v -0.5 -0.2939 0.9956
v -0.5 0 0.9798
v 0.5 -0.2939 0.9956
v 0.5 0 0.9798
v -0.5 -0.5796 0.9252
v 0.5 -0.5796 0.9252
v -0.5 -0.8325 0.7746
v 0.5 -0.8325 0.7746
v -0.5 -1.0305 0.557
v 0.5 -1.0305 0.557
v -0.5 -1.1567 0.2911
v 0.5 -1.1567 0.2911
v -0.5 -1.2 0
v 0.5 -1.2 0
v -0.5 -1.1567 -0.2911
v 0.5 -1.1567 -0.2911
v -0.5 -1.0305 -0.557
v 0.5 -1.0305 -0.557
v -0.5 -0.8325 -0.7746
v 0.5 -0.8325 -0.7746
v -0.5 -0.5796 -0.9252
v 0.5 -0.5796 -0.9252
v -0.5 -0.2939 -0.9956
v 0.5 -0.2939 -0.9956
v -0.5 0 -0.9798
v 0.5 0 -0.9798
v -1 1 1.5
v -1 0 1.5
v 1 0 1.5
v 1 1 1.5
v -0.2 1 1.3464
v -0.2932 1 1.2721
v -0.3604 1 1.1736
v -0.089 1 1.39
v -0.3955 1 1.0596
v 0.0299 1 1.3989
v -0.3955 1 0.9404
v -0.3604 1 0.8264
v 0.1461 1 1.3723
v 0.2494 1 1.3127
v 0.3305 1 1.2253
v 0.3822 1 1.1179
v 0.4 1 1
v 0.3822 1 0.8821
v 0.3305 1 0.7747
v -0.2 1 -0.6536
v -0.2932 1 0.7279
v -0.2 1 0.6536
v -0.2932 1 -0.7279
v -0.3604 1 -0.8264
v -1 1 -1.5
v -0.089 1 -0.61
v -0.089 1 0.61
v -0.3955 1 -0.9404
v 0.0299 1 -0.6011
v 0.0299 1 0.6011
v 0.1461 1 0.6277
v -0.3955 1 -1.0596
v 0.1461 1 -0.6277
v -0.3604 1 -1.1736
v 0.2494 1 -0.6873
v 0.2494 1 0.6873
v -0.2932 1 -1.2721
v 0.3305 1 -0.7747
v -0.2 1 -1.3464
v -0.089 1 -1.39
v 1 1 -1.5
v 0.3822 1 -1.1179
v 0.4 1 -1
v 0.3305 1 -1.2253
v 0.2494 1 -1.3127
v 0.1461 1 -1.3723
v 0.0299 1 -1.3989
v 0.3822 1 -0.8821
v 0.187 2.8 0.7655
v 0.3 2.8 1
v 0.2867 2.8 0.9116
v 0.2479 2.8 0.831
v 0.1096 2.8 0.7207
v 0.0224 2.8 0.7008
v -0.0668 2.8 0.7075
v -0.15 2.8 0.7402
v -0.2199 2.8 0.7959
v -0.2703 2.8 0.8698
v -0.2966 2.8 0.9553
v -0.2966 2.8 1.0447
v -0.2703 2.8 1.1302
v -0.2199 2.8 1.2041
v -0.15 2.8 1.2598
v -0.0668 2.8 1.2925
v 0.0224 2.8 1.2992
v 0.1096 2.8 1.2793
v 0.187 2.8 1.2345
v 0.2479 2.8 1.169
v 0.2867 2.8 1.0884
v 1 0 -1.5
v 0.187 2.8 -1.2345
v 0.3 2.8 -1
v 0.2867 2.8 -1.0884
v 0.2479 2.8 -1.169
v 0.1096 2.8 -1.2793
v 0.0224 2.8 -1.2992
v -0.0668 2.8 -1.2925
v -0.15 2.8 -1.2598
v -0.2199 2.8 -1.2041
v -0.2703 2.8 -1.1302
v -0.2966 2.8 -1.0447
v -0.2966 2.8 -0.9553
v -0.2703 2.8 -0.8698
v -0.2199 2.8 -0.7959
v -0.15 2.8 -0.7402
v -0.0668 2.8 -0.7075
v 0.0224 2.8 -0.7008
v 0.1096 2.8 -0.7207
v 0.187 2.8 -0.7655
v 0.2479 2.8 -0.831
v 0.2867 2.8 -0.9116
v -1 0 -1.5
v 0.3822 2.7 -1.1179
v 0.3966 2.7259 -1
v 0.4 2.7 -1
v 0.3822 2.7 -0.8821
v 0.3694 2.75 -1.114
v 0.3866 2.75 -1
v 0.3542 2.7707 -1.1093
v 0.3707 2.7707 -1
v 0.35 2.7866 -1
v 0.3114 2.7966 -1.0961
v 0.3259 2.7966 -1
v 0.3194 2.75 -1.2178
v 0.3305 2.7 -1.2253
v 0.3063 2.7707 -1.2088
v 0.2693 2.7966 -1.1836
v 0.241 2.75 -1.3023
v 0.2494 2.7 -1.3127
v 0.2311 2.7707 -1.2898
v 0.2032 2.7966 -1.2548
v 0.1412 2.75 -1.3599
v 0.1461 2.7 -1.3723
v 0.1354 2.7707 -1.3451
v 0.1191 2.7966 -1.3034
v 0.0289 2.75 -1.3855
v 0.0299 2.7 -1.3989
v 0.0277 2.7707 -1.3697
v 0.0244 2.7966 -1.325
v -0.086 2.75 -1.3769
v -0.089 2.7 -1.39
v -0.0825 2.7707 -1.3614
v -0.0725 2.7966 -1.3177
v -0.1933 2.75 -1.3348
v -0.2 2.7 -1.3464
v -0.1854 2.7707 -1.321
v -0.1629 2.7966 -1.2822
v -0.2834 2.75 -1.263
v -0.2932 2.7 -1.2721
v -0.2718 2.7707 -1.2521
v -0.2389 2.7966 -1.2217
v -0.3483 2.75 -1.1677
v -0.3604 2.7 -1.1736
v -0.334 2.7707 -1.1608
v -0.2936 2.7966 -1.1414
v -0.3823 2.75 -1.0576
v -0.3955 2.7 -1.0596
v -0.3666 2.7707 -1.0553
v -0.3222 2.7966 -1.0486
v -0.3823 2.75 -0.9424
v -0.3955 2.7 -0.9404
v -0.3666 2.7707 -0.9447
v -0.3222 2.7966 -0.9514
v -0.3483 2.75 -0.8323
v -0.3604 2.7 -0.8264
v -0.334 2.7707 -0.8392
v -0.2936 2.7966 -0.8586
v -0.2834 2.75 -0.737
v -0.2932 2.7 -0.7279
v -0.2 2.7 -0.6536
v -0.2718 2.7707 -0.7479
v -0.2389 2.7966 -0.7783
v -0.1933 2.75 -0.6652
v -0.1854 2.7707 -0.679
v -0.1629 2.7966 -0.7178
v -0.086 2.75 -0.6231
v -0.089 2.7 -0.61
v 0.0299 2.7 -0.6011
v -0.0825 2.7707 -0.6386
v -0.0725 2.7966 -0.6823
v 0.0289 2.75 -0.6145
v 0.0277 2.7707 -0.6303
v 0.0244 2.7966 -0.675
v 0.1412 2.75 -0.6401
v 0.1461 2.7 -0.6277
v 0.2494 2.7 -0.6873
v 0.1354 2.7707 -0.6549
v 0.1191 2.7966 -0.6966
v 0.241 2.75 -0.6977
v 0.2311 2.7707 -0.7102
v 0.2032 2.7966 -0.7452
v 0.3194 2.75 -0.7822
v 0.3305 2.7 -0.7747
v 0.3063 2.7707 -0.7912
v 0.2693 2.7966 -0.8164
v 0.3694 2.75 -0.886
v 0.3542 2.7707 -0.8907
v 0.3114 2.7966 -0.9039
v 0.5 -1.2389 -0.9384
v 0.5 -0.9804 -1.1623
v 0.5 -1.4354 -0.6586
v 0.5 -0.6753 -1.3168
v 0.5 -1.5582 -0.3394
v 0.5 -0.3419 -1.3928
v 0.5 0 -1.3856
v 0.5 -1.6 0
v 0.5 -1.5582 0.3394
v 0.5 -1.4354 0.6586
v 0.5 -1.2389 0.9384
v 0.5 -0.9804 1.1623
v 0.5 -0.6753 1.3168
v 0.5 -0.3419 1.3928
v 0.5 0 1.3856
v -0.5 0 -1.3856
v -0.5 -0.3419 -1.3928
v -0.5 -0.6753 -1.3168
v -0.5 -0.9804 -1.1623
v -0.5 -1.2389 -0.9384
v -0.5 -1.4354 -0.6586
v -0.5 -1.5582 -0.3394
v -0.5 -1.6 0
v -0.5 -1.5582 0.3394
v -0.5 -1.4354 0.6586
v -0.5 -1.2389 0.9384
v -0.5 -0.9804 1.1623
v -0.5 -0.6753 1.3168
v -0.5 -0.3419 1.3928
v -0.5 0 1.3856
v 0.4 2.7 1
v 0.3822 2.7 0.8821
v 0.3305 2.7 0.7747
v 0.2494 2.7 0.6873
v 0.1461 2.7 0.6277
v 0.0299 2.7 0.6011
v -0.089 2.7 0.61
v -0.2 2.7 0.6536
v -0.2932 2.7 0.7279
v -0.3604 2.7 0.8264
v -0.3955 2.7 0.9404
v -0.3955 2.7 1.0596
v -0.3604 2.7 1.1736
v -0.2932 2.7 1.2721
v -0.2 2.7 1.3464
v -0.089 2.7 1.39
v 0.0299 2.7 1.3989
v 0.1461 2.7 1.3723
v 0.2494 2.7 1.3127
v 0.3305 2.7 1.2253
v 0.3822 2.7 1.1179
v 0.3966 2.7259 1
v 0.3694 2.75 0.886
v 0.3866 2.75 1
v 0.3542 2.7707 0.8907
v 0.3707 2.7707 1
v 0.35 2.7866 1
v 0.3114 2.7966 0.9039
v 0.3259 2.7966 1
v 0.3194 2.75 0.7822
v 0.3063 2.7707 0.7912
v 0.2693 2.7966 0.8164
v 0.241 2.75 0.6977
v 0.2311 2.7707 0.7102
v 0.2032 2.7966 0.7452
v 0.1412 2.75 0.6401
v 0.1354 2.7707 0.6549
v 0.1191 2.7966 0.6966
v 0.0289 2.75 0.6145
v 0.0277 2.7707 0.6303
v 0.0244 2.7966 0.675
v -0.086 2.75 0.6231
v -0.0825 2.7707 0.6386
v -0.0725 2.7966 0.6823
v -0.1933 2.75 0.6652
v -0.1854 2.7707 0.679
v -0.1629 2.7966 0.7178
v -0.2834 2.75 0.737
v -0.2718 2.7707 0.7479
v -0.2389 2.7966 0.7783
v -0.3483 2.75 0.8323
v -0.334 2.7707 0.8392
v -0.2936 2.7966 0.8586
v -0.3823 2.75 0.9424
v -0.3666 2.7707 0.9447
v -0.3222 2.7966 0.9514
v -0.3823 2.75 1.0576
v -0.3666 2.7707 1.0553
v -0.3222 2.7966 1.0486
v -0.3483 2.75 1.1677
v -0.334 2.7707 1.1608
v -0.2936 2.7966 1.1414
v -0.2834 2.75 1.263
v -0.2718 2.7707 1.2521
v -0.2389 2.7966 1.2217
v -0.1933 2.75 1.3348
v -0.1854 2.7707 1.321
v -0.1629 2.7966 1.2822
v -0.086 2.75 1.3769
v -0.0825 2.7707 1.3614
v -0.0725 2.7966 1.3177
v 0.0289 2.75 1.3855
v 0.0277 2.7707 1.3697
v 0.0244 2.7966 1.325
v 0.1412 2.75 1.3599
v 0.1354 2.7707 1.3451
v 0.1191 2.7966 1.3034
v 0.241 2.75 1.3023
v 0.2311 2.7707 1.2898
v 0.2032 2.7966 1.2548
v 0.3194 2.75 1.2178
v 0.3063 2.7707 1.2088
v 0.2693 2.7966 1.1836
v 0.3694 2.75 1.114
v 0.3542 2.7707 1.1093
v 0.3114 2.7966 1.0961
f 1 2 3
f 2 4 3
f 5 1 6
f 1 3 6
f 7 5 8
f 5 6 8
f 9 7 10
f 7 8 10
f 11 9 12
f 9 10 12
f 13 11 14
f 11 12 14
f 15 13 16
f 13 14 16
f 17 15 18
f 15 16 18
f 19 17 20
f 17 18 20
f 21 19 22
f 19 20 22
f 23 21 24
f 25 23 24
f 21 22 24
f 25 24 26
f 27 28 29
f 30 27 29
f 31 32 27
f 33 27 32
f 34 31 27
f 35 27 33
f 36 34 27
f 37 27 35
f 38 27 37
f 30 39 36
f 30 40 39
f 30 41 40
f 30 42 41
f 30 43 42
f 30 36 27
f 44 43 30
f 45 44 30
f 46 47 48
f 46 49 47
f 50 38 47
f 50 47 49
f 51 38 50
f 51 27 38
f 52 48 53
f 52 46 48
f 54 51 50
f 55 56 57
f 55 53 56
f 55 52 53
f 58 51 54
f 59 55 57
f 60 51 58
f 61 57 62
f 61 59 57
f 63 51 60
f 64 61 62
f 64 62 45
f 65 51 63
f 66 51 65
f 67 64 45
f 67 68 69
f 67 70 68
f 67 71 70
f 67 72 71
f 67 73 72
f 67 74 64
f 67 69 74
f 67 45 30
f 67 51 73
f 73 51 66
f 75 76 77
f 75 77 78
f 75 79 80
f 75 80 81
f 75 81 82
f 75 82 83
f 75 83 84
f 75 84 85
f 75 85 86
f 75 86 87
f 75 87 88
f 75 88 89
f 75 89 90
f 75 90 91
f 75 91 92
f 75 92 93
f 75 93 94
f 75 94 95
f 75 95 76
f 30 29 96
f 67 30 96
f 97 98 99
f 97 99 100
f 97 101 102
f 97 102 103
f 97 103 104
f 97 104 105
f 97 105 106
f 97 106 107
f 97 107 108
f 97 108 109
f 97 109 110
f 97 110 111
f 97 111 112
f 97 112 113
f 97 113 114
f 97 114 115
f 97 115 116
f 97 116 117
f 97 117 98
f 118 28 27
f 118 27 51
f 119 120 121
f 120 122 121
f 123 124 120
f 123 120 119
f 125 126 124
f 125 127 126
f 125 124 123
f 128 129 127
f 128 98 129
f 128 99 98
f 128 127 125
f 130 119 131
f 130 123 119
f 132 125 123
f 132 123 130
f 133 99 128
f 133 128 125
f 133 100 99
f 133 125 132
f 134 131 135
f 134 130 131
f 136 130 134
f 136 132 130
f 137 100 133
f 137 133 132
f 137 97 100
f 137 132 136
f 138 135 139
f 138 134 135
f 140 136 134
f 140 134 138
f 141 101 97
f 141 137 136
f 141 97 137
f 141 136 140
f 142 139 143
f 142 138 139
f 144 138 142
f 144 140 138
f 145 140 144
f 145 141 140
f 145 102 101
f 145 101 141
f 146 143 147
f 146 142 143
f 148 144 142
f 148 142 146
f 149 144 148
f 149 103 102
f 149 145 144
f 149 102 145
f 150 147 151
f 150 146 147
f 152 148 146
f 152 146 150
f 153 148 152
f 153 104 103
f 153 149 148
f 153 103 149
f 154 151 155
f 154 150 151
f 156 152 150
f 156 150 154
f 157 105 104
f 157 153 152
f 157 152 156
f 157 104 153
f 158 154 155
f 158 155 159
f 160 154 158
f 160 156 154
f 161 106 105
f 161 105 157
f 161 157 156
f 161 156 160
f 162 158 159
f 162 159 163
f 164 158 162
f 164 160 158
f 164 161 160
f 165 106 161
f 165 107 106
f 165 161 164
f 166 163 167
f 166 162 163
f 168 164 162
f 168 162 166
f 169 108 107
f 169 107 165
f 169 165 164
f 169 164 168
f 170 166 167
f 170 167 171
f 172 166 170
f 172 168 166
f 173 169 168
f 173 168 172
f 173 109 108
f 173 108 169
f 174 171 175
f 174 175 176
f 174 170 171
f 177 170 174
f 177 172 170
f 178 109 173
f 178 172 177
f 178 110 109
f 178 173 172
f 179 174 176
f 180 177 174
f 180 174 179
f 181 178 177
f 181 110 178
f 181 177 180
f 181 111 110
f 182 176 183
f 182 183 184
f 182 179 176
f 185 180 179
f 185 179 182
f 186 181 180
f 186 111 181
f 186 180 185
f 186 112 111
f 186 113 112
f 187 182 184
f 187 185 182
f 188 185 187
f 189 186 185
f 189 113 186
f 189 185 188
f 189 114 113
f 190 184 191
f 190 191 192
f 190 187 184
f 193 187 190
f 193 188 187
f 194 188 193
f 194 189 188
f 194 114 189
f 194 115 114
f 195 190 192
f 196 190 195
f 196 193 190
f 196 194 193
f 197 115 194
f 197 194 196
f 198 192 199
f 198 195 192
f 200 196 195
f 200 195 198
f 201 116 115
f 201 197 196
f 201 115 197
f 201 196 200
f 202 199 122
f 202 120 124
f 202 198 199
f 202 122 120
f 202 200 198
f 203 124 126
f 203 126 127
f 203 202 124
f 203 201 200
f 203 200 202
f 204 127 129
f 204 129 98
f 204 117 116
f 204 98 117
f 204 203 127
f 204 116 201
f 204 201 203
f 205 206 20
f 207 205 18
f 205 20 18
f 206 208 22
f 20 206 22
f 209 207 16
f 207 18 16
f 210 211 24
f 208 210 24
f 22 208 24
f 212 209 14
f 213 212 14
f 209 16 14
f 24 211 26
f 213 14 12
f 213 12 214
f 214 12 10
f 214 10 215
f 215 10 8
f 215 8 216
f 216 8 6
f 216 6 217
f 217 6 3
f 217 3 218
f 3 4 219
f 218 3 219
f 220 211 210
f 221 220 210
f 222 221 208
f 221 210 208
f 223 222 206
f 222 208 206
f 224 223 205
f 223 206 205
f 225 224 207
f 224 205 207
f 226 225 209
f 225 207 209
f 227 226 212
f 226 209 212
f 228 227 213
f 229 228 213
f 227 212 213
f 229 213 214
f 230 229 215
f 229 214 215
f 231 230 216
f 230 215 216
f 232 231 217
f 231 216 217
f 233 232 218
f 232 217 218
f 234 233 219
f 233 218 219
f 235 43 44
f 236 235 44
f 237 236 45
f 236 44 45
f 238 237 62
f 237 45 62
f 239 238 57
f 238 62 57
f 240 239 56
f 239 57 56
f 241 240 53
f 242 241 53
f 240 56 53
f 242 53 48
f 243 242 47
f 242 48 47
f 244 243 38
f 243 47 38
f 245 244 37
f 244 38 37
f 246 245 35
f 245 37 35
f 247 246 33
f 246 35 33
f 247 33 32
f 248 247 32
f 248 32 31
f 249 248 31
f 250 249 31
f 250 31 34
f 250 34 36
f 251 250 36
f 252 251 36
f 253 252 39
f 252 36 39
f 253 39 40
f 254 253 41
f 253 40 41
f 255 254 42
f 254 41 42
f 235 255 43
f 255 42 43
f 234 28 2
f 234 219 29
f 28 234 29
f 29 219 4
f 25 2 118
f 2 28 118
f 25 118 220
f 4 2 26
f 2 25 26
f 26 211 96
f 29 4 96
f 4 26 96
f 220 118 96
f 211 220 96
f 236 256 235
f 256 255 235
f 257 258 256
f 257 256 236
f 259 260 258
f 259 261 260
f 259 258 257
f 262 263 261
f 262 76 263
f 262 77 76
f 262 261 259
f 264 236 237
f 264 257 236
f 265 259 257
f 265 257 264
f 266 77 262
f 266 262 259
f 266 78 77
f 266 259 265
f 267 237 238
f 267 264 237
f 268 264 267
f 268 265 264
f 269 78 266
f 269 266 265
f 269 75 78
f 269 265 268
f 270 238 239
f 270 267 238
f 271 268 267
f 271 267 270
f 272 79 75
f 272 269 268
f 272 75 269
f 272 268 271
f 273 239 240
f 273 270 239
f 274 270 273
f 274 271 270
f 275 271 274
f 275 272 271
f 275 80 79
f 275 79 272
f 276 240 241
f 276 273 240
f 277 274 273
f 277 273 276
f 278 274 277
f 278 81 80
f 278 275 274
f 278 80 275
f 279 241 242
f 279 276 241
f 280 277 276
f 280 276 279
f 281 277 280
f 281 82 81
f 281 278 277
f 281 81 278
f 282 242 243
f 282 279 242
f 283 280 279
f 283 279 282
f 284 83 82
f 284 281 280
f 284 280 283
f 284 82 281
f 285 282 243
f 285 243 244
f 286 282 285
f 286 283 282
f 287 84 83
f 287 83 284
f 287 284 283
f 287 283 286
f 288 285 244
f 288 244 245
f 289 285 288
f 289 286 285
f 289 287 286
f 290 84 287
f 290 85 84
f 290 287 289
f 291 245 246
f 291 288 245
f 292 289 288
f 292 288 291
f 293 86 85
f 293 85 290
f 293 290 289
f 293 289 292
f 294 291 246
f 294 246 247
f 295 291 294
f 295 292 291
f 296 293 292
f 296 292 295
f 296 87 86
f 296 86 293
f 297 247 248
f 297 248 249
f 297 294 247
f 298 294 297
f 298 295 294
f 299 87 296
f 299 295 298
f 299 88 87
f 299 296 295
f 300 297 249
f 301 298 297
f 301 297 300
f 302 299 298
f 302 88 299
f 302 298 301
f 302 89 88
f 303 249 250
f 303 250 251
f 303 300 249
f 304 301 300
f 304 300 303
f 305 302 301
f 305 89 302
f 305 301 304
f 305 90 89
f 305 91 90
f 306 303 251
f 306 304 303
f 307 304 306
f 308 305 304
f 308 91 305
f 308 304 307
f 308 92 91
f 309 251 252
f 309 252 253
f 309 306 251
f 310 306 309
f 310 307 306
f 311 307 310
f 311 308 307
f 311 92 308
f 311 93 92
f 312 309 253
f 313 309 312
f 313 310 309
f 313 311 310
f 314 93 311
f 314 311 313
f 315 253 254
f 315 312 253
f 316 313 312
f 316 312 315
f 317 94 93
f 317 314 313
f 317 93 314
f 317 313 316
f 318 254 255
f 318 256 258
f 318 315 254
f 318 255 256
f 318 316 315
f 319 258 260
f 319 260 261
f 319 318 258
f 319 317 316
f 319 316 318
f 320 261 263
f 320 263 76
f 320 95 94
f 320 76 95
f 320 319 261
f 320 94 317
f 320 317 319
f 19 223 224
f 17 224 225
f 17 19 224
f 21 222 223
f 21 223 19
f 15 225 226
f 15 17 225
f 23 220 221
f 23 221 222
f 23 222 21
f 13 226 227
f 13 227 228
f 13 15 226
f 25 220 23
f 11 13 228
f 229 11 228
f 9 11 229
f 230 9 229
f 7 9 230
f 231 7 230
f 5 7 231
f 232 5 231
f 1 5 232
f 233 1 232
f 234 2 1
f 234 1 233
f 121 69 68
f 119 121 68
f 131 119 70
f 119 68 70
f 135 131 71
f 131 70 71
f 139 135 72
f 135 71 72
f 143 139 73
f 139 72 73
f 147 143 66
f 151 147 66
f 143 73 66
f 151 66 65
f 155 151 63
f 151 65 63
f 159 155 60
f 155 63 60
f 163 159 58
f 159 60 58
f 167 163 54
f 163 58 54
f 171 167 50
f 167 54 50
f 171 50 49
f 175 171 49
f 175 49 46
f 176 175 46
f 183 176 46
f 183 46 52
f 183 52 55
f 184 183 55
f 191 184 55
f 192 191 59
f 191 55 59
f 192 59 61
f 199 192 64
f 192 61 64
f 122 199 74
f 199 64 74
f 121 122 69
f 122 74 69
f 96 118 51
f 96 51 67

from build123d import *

# Parameters (mm, degrees)
SKETCH1_W                     = 2
SKETCH1_H                     = 3
NP2_IMPLANTER_LOCK_BASE_DEPTH = 1
SKETCH2_R                     = 0.4
LOCK_ARMS_DEPTH               = 1.8
RETREIVAL_HOOKS_DEPTH         = 0.5
FILLET1_R                     = 0.1


with BuildPart() as part:
    # Sketch1 → NP2 Implanter Lock Base (new body)
    with BuildSketch(Plane(origin=(0, 0, 0), x_dir=(1, 0, 0), z_dir=(0, 1, 0))):
        Rectangle(SKETCH1_W, SKETCH1_H)
    extrude(amount=NP2_IMPLANTER_LOCK_BASE_DEPTH)

    # Sketch2 → Lock arms (add)
    with BuildSketch(Plane(origin=(0, 1, 0), x_dir=(1, 0, 0), z_dir=(0, 1, 0))):
        with Locations((0, 1)):
            Circle(SKETCH2_R)
        with Locations((0, -1)):
            Circle(SKETCH2_R)
    extrude(amount=LOCK_ARMS_DEPTH)

    # Sketch3 → Retreival Hooks (add, symmetric)
    with BuildSketch(Plane(origin=(0, 0, 0), x_dir=(0, 0, -1), z_dir=(1, 0, 0))):
        with BuildLine():
            Line((-1.385640646, 0), (-0.979795897, 0))
            ThreePointArc((-0.979795897, 0), (0, -1.2), (0.979795897, 0))
            Line((0.979795897, 0), (1.385640646, 0))
            ThreePointArc((1.385640646, 0), (0, -1.6), (-1.385640646, 0))
        make_face()
    extrude(amount=RETREIVAL_HOOKS_DEPTH, both=True)

    # Fillet1
    fillet1_edges = [part.edges().sort_by_distance(p)[0] for p in [
        (-0.4, 2.8, -1),
        (-0.4, 2.8, 1),
    ]]
    fillet(fillet1_edges, radius=FILLET1_R)


solid = part.part
